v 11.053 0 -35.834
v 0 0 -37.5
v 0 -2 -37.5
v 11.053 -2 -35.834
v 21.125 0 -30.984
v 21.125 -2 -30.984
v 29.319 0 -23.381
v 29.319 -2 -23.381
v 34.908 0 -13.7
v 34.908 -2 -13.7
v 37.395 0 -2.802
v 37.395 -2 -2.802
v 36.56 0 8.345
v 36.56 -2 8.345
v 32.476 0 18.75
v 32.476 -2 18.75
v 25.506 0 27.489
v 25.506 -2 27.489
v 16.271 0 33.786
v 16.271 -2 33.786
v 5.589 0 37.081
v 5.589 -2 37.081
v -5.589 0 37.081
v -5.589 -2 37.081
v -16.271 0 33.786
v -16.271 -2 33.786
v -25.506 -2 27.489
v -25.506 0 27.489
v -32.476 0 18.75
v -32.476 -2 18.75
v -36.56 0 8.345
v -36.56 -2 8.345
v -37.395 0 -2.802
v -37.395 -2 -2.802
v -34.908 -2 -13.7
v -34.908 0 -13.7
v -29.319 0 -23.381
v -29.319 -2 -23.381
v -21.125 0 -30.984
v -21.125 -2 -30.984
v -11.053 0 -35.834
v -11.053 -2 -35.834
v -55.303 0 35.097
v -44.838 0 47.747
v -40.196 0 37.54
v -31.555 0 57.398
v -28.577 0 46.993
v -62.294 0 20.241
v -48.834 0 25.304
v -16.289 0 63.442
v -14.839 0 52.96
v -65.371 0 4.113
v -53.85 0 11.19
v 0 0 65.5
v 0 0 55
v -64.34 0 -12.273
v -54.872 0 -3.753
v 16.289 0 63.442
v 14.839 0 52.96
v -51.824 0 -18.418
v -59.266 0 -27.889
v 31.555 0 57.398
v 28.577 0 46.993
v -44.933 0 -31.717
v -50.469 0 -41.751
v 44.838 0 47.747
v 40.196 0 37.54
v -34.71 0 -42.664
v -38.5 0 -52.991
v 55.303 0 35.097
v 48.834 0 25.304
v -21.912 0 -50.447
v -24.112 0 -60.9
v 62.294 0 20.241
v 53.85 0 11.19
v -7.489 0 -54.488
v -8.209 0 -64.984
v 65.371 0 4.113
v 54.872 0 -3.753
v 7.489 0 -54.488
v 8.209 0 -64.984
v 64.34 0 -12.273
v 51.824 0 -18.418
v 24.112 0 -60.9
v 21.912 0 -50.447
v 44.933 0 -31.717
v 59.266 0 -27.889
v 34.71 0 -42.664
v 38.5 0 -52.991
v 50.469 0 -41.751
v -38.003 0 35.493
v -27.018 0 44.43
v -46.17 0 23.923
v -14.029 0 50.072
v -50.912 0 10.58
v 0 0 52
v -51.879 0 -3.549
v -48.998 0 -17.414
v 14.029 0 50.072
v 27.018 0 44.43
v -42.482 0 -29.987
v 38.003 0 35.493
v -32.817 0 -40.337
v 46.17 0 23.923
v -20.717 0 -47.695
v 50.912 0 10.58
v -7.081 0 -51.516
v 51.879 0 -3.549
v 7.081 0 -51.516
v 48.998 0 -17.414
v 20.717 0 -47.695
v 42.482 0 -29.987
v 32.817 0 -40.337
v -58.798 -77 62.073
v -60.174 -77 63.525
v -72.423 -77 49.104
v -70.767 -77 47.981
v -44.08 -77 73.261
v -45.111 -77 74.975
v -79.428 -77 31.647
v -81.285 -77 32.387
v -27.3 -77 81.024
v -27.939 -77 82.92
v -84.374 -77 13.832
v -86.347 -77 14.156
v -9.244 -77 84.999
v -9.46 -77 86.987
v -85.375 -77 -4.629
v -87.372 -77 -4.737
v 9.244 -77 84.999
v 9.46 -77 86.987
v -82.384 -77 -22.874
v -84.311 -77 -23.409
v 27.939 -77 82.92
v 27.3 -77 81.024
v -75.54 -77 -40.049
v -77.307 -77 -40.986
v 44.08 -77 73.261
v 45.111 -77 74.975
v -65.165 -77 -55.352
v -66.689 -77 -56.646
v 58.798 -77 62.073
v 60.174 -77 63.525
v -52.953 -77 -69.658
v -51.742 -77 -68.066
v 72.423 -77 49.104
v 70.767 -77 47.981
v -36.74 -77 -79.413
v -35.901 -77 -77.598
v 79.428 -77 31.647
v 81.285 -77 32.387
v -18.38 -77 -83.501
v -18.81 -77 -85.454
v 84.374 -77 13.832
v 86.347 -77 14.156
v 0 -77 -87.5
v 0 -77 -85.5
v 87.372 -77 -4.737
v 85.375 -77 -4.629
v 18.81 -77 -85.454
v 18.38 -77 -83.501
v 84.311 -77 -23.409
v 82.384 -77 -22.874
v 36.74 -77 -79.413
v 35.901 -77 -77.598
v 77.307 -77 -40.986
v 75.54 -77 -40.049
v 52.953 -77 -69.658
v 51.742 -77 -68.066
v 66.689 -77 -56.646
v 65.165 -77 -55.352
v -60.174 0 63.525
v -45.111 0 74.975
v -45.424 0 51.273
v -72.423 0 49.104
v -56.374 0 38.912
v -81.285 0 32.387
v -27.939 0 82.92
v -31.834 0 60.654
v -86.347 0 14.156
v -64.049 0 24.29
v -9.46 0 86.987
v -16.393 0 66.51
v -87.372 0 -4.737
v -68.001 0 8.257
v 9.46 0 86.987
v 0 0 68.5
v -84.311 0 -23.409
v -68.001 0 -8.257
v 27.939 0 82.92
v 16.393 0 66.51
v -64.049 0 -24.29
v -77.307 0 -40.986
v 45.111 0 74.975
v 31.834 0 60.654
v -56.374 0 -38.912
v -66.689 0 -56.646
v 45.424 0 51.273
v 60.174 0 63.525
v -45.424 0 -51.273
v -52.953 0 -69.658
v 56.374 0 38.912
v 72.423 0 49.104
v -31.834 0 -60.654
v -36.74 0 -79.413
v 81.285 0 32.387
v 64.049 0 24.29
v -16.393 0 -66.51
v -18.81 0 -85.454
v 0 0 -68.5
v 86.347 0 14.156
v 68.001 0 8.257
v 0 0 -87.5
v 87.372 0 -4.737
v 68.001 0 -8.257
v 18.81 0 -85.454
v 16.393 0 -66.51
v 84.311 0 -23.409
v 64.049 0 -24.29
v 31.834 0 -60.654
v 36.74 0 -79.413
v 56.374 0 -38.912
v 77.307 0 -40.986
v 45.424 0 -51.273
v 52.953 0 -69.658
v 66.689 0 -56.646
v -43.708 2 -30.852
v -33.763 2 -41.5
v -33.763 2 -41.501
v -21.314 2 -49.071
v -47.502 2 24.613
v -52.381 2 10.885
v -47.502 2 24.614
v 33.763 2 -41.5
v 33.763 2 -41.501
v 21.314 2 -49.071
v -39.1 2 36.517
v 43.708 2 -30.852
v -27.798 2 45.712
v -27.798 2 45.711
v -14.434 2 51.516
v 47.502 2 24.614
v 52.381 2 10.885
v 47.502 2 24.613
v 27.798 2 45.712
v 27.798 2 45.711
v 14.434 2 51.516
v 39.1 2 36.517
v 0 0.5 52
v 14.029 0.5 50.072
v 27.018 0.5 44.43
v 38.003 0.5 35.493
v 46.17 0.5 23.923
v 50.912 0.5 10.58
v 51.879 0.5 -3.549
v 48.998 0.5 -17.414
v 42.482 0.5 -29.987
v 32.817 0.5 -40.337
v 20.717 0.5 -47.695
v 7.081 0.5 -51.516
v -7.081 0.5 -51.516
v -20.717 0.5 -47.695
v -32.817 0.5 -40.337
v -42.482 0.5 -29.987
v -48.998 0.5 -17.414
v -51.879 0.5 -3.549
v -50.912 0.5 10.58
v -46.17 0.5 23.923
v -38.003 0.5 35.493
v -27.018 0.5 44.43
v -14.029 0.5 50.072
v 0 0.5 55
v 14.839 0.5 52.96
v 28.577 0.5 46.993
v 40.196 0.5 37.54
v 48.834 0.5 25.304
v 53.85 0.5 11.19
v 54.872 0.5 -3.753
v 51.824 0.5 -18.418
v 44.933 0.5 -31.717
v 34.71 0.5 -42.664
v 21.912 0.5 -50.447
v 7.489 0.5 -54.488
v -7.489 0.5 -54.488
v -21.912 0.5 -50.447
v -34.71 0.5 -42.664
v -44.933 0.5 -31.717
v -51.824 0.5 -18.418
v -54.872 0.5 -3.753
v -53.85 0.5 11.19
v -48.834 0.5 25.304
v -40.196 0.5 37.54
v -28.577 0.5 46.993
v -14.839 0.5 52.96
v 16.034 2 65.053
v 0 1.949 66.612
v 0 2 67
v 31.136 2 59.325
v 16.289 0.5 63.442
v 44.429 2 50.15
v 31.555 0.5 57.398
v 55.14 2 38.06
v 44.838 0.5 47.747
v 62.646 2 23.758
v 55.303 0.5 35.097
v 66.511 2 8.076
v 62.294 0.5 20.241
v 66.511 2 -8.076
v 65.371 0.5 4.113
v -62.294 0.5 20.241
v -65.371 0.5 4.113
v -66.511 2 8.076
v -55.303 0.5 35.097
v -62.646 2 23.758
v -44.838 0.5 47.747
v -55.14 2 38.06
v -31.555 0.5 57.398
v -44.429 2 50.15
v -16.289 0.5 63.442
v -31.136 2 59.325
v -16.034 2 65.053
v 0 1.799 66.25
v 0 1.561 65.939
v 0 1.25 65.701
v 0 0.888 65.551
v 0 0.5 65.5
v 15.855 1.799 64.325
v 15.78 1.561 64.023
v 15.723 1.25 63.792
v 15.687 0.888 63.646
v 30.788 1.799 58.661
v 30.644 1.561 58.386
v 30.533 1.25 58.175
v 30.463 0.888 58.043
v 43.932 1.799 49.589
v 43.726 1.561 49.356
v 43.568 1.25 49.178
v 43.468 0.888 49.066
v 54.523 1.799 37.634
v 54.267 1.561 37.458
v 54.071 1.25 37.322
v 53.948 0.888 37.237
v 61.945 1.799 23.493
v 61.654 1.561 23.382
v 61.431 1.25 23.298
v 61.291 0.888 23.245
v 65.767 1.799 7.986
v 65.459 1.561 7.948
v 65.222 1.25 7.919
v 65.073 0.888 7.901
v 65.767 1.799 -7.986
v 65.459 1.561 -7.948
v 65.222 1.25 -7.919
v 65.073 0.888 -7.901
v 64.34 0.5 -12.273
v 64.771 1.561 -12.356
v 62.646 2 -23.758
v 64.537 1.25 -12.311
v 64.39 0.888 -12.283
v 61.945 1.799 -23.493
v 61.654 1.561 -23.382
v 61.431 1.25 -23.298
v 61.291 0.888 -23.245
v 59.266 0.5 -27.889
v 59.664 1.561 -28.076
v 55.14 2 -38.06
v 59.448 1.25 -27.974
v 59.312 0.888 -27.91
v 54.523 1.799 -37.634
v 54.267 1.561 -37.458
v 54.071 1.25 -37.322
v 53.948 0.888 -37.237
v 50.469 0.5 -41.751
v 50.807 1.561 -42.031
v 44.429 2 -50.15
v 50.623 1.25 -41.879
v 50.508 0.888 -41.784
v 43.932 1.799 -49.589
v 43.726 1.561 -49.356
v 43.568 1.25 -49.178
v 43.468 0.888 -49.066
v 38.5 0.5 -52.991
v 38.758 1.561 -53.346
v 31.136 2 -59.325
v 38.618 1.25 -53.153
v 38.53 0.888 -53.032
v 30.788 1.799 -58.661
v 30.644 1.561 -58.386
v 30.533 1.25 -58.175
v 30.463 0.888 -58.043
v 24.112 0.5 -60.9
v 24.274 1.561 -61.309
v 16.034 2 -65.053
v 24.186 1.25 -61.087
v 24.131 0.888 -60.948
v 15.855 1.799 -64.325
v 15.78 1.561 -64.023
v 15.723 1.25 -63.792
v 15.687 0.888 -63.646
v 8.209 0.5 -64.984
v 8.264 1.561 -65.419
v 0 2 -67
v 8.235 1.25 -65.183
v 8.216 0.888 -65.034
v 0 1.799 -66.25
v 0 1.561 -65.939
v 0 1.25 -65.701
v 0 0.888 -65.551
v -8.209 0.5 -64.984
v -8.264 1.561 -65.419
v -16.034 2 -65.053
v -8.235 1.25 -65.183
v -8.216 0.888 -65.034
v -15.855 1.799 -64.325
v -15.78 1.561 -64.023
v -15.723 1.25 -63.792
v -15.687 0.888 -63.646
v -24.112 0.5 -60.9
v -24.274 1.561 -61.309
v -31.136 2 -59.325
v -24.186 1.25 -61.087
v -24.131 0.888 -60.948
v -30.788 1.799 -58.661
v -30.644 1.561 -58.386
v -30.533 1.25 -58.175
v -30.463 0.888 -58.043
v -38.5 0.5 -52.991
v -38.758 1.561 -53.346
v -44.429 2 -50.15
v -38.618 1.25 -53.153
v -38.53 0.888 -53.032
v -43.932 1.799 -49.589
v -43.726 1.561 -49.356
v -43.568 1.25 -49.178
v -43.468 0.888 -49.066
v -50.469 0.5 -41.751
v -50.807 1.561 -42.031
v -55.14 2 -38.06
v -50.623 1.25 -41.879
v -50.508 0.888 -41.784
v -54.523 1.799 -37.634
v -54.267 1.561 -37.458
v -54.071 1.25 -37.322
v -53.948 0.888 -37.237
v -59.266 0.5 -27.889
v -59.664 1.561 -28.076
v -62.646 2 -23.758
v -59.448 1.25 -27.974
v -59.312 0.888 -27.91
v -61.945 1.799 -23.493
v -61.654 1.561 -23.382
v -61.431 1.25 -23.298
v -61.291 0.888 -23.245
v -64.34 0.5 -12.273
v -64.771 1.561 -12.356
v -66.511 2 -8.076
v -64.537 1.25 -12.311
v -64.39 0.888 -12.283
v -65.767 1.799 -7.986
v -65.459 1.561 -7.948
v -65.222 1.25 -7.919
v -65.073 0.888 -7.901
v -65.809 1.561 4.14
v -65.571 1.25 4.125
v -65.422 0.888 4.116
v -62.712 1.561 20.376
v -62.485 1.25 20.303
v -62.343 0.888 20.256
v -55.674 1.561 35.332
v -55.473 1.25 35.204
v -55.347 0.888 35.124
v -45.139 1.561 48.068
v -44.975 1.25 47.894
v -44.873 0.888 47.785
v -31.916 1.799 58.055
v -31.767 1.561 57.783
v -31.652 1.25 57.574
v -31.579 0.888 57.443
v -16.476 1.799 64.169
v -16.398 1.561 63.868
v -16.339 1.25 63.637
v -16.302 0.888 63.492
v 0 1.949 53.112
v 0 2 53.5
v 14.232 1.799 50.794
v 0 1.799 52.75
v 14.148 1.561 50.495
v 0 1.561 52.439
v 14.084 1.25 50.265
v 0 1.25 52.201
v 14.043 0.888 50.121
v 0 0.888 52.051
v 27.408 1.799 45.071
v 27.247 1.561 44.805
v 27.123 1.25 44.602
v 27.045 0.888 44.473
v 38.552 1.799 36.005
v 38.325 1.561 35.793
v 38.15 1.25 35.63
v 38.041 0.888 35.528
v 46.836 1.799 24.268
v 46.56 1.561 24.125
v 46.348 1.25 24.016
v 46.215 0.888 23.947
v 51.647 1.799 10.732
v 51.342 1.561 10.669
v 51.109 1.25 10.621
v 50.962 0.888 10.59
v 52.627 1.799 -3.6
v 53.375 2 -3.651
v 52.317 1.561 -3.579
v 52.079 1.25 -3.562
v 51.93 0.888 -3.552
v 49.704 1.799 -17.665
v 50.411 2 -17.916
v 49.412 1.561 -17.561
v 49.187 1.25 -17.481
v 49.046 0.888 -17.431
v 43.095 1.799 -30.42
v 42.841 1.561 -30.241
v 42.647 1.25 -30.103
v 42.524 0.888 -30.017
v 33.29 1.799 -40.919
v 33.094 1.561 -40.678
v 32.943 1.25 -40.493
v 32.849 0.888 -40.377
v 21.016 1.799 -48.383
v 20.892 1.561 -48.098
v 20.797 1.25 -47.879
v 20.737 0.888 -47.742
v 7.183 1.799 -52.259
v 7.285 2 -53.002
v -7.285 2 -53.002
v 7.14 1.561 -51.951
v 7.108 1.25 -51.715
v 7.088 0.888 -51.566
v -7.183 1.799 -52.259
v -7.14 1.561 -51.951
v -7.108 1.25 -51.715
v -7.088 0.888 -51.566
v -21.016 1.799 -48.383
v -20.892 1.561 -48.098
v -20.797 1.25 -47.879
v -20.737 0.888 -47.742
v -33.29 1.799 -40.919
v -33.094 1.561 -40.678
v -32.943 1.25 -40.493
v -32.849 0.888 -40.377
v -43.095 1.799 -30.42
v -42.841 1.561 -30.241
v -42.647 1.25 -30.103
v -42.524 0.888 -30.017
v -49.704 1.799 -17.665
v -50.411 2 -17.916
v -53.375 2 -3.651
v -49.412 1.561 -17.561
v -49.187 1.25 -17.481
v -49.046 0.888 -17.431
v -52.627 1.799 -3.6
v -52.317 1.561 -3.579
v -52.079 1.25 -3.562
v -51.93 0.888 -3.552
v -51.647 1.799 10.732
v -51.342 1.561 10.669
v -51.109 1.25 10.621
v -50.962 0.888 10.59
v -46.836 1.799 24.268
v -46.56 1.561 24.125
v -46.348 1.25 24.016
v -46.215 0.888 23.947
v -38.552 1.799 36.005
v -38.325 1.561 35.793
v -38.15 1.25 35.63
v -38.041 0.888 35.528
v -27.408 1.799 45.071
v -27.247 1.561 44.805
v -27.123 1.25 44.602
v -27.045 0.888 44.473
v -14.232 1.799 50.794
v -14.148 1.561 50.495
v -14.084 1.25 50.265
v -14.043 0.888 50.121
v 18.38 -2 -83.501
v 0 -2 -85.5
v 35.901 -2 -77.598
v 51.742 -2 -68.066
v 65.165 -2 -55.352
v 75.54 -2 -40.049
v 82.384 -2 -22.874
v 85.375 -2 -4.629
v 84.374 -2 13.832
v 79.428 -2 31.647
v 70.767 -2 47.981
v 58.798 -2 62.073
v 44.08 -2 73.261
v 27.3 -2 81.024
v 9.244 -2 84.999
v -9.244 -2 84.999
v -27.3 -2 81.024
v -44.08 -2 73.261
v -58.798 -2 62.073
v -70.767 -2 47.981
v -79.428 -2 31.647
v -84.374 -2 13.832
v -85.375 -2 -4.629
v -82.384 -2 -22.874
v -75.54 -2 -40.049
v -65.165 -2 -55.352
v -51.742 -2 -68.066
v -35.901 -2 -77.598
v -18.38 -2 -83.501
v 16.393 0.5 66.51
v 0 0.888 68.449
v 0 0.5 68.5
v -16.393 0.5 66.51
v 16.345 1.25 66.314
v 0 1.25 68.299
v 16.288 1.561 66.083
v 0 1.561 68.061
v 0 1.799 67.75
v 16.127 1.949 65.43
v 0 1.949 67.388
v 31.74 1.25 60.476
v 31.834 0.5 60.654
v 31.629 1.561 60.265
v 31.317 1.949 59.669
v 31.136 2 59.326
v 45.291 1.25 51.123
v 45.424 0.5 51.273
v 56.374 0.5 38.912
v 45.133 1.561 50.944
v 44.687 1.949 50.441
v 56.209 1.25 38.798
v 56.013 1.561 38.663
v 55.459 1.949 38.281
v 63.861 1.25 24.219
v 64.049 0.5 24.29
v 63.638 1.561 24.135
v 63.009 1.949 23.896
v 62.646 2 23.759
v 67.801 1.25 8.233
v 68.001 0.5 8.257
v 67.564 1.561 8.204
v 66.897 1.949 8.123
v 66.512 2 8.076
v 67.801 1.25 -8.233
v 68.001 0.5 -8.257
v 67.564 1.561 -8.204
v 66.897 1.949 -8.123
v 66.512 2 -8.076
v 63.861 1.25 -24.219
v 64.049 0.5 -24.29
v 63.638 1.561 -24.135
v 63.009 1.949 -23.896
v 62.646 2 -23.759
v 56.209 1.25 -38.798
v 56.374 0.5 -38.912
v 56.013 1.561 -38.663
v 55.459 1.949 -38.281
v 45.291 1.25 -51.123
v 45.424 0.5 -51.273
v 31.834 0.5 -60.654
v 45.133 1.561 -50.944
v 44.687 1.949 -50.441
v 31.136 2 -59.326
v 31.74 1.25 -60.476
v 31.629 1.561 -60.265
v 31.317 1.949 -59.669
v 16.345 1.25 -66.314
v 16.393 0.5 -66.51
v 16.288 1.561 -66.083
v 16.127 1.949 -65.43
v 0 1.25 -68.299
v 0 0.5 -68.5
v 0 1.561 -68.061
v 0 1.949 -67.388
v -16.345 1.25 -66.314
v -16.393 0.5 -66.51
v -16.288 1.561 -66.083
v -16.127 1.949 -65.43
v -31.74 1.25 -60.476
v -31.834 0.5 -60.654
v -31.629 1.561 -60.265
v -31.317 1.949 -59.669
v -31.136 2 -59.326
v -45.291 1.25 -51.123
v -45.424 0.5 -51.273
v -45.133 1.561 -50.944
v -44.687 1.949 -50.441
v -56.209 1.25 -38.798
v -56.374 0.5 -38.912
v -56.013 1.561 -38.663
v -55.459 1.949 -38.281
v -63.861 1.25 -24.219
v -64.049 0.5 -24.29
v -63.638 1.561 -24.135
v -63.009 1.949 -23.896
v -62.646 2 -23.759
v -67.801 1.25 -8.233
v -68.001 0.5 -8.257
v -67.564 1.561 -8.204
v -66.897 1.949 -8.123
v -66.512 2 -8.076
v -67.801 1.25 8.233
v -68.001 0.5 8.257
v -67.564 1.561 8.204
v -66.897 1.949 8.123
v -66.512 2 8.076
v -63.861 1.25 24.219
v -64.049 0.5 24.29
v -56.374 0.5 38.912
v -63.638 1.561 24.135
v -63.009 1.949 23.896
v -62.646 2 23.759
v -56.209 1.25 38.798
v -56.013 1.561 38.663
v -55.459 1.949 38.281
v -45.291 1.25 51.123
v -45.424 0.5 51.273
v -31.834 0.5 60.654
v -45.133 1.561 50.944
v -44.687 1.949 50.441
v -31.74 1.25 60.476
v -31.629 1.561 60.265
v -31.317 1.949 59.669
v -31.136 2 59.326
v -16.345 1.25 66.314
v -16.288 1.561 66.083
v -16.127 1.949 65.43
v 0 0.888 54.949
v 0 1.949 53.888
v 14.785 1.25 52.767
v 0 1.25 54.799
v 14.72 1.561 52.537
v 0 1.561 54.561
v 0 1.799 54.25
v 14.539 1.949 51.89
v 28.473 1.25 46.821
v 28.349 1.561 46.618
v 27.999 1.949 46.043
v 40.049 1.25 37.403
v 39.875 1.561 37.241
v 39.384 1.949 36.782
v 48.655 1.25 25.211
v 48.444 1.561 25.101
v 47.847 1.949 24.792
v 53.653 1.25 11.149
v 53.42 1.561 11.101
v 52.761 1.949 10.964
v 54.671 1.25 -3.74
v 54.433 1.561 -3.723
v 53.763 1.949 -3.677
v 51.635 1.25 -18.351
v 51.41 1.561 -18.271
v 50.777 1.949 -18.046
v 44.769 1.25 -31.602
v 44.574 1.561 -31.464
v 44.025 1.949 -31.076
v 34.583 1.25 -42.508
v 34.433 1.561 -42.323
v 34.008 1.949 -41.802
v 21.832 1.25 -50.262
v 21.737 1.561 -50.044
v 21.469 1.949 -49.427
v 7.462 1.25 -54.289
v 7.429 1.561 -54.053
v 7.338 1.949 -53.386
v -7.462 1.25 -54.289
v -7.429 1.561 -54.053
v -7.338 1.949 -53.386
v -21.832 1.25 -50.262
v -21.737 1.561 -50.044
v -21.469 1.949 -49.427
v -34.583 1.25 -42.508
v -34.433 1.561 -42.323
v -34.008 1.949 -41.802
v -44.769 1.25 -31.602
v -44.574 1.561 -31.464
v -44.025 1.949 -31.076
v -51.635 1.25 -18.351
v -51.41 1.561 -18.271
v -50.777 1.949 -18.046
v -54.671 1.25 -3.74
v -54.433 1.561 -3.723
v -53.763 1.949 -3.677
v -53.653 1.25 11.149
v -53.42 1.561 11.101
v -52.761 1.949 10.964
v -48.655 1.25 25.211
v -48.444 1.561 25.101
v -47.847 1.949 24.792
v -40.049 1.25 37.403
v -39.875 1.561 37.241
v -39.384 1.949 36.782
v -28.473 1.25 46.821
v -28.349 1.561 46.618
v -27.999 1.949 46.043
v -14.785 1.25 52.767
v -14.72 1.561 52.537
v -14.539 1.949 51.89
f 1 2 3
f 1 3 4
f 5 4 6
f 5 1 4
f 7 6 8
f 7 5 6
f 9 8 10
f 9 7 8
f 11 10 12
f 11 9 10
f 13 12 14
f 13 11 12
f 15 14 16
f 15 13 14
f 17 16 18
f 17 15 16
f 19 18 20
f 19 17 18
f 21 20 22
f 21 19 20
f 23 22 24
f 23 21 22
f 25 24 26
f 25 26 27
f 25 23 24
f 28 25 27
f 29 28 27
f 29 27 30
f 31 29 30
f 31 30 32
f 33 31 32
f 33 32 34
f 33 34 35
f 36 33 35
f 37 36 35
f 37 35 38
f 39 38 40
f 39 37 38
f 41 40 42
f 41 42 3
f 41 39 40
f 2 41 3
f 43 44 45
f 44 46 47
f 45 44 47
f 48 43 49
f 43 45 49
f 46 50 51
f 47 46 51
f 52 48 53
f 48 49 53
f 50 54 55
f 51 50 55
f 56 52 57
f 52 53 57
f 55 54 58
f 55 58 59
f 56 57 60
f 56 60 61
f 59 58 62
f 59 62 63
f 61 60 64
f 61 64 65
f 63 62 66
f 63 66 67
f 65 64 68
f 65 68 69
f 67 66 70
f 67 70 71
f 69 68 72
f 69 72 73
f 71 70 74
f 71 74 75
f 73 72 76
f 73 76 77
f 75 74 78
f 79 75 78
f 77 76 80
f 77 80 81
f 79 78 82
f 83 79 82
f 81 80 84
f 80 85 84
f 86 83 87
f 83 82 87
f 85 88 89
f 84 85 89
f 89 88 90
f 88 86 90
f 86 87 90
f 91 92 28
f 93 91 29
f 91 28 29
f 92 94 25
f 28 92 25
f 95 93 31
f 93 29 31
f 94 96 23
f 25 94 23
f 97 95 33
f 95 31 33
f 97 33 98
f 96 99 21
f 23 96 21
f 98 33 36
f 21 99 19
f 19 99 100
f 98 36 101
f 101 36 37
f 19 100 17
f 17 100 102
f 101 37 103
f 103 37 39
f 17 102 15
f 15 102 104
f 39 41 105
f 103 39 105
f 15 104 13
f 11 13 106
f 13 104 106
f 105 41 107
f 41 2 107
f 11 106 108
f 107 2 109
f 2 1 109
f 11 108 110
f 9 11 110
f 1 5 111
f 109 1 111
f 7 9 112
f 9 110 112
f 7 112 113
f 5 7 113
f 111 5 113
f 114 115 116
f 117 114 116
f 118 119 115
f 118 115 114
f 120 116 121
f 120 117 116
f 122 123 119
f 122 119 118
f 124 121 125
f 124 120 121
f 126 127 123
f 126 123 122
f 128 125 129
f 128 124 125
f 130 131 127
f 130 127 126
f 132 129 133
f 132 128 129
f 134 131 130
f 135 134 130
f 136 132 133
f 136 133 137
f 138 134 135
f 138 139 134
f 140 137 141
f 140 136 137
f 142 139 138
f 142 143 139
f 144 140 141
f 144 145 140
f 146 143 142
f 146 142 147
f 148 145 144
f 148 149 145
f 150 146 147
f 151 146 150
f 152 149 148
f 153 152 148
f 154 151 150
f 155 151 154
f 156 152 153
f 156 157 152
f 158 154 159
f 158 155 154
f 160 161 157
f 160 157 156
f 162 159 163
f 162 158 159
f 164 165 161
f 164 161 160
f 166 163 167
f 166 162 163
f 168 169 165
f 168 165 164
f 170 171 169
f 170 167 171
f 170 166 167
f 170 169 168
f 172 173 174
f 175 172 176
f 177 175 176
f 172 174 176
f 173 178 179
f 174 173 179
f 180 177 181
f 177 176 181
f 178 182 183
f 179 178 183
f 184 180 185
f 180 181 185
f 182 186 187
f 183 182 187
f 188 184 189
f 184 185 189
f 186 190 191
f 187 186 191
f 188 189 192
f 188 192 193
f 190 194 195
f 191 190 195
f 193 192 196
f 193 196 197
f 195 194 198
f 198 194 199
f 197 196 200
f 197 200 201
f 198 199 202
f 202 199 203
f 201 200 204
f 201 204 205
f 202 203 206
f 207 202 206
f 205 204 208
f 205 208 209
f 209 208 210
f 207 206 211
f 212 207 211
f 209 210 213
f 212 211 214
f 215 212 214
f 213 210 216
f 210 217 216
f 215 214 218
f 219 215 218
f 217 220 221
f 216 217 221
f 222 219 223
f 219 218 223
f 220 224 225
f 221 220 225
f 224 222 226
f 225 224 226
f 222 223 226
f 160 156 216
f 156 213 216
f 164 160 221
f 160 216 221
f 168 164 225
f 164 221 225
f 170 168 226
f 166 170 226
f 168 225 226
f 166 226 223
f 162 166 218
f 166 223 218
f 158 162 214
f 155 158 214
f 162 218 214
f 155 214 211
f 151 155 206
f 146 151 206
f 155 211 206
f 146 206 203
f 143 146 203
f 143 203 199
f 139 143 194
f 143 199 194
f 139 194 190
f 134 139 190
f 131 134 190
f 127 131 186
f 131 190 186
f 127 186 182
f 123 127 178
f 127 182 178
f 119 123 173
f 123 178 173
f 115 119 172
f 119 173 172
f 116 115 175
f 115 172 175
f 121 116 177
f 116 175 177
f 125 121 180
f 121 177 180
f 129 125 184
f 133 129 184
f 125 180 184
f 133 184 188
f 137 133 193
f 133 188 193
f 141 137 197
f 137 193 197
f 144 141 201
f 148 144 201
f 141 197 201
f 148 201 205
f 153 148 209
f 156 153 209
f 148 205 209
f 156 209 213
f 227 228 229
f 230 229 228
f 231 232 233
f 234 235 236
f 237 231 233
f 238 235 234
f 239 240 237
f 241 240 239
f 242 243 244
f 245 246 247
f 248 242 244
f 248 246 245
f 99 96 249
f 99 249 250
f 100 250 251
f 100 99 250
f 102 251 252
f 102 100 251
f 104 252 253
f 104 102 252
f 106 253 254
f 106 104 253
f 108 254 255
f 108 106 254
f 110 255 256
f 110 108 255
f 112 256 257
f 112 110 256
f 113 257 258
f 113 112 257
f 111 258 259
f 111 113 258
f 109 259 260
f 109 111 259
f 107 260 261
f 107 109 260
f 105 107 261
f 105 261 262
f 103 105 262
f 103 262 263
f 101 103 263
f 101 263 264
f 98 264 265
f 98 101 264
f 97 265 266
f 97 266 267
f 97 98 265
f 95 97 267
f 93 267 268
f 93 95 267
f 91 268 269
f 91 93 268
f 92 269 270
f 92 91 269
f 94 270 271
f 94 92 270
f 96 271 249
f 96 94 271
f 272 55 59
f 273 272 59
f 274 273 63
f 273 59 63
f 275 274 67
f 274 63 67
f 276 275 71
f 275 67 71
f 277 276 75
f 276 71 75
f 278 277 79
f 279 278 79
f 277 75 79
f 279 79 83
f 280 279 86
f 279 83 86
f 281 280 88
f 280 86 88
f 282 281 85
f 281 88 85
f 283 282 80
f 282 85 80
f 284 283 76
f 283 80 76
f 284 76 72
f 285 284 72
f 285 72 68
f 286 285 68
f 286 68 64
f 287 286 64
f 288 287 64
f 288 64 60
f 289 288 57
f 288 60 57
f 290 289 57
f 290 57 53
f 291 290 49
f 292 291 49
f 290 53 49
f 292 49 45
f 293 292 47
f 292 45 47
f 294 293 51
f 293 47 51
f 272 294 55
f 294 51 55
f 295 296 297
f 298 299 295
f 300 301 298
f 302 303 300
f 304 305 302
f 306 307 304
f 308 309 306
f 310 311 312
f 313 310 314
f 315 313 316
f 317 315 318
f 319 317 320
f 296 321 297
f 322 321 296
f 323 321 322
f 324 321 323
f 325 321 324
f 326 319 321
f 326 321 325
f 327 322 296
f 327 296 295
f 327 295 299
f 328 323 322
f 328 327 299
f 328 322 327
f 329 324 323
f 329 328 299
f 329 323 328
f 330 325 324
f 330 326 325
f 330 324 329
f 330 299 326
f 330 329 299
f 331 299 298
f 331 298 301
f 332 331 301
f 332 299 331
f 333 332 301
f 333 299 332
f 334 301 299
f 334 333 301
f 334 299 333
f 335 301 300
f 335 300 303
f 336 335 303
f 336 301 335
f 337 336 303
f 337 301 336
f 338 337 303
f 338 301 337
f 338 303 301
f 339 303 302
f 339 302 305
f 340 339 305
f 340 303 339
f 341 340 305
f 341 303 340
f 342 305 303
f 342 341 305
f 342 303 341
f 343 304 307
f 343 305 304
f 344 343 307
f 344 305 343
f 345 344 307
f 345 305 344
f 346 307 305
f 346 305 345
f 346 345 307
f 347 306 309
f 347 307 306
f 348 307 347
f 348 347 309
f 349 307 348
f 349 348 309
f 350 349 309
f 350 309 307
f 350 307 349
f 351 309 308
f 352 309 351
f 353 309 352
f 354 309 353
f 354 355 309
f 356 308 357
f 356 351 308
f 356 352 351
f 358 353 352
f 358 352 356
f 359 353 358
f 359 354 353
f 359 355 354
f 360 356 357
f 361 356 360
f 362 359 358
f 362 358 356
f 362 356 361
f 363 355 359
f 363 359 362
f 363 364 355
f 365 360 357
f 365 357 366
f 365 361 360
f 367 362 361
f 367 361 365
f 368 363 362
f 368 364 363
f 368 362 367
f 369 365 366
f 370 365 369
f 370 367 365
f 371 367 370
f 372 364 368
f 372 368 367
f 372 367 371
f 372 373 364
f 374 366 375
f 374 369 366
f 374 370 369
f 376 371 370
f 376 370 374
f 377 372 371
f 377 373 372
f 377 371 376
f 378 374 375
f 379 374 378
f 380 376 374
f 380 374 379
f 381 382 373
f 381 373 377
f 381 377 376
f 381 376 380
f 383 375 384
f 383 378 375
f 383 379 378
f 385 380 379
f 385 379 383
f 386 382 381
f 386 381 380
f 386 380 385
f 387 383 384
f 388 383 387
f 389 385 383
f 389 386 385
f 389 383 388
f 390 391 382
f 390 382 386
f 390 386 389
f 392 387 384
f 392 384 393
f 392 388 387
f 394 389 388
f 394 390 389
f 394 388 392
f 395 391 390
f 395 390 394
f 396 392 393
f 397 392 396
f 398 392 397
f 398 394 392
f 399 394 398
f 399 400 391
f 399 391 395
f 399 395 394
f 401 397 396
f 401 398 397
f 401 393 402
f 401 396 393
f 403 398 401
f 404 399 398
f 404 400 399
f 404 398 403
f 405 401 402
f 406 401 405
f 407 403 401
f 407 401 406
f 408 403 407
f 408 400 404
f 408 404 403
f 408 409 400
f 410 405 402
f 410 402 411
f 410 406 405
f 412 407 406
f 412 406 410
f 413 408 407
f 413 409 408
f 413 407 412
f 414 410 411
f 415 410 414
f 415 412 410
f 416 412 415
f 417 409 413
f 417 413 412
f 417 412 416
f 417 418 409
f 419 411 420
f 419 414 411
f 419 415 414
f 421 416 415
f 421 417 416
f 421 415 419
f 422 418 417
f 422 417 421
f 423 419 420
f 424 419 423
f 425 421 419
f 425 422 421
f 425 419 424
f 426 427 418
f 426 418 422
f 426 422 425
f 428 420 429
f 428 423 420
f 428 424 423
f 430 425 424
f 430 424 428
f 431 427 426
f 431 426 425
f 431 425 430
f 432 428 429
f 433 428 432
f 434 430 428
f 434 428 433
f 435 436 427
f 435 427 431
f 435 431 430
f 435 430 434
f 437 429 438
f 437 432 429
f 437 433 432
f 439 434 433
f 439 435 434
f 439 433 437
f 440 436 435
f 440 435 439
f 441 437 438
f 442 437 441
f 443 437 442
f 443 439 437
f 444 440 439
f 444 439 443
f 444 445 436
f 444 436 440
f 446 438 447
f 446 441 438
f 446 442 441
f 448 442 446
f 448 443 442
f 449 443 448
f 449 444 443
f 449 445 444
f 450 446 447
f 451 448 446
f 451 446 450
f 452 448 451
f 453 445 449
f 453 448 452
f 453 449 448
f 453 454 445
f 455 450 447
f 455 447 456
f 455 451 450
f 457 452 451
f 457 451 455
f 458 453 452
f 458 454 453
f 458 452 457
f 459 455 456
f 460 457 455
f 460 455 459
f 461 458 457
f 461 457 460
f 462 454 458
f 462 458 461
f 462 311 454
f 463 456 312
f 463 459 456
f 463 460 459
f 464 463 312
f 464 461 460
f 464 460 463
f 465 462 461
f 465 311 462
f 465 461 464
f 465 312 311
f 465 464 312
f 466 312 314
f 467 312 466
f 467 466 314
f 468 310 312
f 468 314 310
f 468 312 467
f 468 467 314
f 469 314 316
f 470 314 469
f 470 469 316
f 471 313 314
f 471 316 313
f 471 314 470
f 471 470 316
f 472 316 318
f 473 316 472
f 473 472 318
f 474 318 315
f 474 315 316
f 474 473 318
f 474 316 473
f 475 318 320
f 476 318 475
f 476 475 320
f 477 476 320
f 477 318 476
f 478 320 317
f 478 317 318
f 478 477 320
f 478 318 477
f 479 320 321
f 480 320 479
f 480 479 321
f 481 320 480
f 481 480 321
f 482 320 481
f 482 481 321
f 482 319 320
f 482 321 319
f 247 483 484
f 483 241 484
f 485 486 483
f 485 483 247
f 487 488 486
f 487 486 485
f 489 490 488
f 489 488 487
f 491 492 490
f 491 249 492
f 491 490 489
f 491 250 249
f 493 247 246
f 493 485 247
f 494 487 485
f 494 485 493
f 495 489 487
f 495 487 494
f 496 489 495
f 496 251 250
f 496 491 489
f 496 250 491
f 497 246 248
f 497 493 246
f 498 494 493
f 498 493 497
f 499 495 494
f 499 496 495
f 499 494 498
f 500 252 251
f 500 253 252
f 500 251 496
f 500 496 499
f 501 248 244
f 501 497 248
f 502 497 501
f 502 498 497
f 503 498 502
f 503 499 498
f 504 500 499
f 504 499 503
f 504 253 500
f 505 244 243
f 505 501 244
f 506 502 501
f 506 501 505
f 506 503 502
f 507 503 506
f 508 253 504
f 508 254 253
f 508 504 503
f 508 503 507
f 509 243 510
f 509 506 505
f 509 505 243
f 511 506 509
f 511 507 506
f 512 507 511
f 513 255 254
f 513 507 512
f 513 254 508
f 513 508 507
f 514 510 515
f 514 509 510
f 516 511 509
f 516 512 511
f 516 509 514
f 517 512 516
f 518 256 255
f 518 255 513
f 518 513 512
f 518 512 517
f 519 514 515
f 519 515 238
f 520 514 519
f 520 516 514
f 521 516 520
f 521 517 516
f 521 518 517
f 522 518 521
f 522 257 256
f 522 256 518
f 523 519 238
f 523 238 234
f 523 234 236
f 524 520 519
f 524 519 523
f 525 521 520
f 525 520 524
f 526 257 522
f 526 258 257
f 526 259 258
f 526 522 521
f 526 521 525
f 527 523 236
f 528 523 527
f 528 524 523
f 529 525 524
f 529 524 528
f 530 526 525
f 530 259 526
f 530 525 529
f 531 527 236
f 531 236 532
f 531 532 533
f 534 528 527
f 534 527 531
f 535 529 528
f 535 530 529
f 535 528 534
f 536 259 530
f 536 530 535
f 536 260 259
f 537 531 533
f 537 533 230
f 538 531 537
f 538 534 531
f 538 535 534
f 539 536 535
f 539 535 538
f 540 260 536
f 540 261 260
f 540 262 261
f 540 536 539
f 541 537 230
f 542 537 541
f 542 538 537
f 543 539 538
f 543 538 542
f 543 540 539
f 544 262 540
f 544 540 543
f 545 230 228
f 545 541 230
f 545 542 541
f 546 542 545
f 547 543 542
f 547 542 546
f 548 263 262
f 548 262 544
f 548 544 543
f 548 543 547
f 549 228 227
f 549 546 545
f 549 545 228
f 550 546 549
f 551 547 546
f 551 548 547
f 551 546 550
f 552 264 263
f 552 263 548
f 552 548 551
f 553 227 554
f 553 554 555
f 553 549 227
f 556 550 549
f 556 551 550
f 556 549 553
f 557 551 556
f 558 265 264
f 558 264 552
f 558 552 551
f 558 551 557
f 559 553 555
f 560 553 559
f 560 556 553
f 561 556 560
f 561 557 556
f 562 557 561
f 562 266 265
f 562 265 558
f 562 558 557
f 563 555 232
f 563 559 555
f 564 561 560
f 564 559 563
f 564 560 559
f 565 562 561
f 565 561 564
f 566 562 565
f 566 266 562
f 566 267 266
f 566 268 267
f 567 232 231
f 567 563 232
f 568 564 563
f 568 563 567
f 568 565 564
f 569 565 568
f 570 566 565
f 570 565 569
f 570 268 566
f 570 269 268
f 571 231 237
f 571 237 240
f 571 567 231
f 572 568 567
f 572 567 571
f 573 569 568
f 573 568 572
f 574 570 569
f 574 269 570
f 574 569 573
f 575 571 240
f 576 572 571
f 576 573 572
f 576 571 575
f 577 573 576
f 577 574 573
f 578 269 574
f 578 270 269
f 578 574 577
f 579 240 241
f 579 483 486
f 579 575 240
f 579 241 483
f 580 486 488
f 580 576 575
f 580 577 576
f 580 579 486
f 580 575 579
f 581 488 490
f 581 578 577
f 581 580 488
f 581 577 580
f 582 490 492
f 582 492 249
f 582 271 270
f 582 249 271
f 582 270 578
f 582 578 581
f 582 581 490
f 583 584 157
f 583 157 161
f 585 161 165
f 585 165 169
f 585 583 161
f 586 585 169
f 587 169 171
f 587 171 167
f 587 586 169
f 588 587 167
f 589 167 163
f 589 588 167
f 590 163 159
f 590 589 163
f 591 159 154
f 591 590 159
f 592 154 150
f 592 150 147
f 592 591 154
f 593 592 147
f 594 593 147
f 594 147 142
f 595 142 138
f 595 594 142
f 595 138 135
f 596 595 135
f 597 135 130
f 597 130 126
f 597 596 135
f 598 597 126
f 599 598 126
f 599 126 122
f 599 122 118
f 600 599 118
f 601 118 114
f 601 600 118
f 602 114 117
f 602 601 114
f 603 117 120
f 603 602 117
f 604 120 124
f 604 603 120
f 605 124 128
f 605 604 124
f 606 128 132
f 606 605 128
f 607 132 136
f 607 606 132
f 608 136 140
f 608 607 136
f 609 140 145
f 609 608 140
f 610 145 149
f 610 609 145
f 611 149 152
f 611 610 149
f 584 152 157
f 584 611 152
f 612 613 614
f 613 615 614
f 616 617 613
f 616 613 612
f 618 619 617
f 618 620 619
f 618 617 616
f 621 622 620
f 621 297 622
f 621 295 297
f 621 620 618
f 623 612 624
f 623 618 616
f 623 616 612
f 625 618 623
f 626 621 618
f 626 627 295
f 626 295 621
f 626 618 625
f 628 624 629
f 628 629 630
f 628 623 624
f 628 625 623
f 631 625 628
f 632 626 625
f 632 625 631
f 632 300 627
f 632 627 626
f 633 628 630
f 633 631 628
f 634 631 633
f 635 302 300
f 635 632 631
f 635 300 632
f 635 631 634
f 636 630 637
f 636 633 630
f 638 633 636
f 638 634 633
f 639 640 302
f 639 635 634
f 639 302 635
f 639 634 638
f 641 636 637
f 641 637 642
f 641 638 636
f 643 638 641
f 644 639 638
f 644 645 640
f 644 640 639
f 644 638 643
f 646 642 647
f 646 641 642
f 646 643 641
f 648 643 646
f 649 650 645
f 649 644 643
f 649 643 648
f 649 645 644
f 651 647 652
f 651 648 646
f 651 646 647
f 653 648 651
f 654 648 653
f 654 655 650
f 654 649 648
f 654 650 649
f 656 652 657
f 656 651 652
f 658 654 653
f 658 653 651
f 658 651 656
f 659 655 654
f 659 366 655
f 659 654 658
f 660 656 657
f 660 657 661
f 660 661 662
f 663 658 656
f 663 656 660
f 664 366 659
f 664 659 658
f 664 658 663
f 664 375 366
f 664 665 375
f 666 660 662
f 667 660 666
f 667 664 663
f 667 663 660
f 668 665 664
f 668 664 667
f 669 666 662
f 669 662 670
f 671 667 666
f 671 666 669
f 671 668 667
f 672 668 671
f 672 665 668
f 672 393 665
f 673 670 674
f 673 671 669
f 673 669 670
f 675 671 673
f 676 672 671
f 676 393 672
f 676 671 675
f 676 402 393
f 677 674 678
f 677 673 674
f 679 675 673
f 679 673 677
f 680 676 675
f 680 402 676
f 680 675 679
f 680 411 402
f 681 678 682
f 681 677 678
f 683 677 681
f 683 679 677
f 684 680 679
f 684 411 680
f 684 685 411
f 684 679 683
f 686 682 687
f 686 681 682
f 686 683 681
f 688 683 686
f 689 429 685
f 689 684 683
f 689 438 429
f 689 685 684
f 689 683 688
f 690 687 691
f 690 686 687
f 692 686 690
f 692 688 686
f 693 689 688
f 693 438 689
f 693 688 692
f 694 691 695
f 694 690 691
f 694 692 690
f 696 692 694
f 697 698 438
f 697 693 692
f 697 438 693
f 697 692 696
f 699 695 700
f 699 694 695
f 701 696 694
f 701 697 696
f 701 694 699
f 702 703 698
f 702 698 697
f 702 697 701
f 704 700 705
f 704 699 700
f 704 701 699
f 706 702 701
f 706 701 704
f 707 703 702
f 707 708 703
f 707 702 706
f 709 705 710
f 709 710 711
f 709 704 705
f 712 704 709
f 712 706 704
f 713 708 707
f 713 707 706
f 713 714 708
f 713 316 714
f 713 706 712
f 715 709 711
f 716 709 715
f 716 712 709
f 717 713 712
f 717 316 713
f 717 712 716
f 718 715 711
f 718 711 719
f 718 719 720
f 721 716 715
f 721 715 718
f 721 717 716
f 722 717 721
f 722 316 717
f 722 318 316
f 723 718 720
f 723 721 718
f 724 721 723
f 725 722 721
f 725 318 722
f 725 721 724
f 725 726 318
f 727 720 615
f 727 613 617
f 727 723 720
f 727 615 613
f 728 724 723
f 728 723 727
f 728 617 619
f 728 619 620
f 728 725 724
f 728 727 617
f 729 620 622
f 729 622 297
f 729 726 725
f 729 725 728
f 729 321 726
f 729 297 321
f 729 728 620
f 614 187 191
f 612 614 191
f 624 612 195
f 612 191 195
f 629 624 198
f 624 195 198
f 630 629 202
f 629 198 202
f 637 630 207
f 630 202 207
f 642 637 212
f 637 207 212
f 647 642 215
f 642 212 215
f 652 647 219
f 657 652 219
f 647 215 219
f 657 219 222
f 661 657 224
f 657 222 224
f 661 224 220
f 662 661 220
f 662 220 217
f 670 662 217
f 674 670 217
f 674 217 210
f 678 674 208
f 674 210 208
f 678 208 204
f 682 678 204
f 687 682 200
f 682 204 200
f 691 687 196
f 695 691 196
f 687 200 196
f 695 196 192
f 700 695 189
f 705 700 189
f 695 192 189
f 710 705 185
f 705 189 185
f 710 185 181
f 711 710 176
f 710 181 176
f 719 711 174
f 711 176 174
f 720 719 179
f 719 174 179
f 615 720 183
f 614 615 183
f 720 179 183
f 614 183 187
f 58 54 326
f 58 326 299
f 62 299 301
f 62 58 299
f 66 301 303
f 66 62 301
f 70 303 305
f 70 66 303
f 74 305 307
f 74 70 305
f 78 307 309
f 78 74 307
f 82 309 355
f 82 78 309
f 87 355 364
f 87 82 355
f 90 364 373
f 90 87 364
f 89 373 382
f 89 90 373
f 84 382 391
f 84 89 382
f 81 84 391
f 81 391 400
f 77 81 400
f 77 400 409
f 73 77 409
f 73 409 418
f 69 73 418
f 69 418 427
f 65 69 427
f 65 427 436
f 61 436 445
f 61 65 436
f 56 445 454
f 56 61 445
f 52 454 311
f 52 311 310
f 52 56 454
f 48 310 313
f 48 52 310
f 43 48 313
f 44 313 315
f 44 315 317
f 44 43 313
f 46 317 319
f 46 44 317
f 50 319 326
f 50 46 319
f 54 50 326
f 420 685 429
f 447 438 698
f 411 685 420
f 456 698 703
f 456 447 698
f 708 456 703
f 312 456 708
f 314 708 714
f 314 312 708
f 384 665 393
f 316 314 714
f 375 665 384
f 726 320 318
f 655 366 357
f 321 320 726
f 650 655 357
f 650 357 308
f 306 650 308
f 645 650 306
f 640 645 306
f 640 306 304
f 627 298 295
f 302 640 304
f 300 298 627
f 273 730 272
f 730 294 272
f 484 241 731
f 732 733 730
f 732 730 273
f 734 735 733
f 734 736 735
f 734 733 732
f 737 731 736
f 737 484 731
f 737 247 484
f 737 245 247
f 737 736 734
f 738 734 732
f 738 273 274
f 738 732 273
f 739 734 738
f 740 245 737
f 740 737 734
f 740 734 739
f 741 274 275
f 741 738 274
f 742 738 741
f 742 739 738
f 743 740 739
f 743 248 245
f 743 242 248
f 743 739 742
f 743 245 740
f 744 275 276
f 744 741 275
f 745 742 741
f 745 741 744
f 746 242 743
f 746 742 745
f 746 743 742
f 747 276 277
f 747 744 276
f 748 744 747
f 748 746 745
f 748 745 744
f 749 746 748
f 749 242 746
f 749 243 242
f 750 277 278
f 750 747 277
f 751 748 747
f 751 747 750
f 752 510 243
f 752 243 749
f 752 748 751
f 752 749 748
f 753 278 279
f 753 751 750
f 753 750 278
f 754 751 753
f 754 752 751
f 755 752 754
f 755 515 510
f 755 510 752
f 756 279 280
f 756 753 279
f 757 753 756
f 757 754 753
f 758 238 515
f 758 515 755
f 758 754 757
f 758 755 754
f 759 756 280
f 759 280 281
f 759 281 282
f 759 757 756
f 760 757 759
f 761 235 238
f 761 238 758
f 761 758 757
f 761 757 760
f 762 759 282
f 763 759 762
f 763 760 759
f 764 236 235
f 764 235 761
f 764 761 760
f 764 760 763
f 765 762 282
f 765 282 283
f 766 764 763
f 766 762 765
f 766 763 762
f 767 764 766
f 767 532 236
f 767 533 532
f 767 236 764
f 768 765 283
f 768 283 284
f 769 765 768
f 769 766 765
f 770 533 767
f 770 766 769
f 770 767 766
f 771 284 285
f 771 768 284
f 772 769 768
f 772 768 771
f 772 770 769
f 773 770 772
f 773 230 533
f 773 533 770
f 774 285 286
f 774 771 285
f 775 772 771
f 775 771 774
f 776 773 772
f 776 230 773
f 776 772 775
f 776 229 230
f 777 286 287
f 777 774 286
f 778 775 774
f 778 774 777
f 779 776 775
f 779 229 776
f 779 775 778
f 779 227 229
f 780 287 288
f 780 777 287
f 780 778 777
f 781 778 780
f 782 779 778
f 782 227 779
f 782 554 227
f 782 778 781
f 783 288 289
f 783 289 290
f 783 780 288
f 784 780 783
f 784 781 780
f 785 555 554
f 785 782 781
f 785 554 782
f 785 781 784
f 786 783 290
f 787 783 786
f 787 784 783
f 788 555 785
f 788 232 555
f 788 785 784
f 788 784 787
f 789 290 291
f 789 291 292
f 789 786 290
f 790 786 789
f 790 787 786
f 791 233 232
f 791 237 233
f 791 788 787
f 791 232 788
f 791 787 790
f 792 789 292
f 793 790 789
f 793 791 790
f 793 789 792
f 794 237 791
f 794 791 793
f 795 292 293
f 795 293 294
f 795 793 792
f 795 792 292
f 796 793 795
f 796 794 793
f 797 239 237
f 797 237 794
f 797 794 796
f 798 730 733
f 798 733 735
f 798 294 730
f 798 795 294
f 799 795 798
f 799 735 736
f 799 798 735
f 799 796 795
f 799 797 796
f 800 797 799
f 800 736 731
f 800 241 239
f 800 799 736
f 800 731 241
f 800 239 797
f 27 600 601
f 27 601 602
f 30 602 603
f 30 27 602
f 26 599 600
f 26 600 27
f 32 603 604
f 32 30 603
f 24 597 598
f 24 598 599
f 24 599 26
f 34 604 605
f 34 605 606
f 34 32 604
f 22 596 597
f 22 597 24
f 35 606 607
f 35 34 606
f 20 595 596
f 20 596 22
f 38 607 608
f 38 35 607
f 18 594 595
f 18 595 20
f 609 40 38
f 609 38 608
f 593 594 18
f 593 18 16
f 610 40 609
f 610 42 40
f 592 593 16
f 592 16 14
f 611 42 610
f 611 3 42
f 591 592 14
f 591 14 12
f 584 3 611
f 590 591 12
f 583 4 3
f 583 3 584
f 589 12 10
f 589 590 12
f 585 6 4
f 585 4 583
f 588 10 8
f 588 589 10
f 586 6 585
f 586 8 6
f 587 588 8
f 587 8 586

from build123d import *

# Parameters (mm, degrees)
SKETCH_1_R        = 68.5
SKETCH_1_R_2      = 65.5
EXTRUDE_1_DEPTH   = 2
SKETCH_1_R_3      = 55
SKETCH_1_R_4      = 52
EXTRUDE_1_2_DEPTH = 2
SKETCH_2_R        = 87.5
SKETCH_2_R_2      = 37.5
EXTRUDE_2_DEPTH   = 2
SKETCH_3_R        = 87.5
SKETCH_3_R_2      = 85.5
EXTRUDE_3_DEPTH   = 75
FILLET_1_R        = 1.5


with BuildPart() as part:
    # 草图1 → 凸台-拉伸1 (new body)
    with BuildSketch(Plane(origin=(0, 0, 0), x_dir=(1, 0, 0), z_dir=(0, 1, 0))):
        with Locations(Location((0, 0, 0), (0, 0, 270))):
            Circle(SKETCH_1_R)
        with Locations(Location((0, 0, 0), (0, 0, 270))):
            Circle(SKETCH_1_R_2, mode=Mode.SUBTRACT)
    extrude(amount=EXTRUDE_1_DEPTH)



with BuildPart() as body_2:
    # 草图1 → Extrude 1 2 (new body)
    with BuildSketch(Plane(origin=(0, 0, 0), x_dir=(1, 0, 0), z_dir=(0, 1, 0))):
        with Locations(Location((0, 0, 0), (0, 0, 270))):
            Circle(SKETCH_1_R_3)
        with Locations(Location((0, 0, 0), (0, 0, 270))):
            Circle(SKETCH_1_R_4, mode=Mode.SUBTRACT)
    extrude(amount=EXTRUDE_1_2_DEPTH)


with BuildPart() as part_1:
    add(part.part)

    add(body_2.part)  # 凸台-拉伸2 merges body 2
    # 草图2 → 凸台-拉伸2 (add)
    with BuildSketch(Plane.XZ):
        with Locations(Location((0, 0, 0), (0, 0, 270))):
            Circle(SKETCH_2_R)
        with Locations(Location((0, 0, 0), (0, 0, 270))):
            Circle(SKETCH_2_R_2, mode=Mode.SUBTRACT)
    extrude(amount=EXTRUDE_2_DEPTH)

    # 草图3 → 凸台-拉伸3 (add)
    with BuildSketch(Plane.XZ.offset(2)):
        with Locations(Location((0, 0, 0), (0, 0, 270))):
            Circle(SKETCH_3_R)
        with Locations(Location((0, 0, 0), (0, 0, 270))):
            Circle(SKETCH_3_R_2, mode=Mode.SUBTRACT)
    extrude(amount=EXTRUDE_3_DEPTH)

    # 圆角1
    fillet_1_edges = [part_1.edges().sort_by_distance(p)[0] for p in [
        (0, 2, -68.5),
        (0, 2, -52),
        (0, 2, -55),
        (0, 2, -65.5),
    ]]
    fillet(fillet_1_edges, radius=FILLET_1_R - 0.0001)  # a hair under: the kernel refuses the full size


solid = part_1.part
